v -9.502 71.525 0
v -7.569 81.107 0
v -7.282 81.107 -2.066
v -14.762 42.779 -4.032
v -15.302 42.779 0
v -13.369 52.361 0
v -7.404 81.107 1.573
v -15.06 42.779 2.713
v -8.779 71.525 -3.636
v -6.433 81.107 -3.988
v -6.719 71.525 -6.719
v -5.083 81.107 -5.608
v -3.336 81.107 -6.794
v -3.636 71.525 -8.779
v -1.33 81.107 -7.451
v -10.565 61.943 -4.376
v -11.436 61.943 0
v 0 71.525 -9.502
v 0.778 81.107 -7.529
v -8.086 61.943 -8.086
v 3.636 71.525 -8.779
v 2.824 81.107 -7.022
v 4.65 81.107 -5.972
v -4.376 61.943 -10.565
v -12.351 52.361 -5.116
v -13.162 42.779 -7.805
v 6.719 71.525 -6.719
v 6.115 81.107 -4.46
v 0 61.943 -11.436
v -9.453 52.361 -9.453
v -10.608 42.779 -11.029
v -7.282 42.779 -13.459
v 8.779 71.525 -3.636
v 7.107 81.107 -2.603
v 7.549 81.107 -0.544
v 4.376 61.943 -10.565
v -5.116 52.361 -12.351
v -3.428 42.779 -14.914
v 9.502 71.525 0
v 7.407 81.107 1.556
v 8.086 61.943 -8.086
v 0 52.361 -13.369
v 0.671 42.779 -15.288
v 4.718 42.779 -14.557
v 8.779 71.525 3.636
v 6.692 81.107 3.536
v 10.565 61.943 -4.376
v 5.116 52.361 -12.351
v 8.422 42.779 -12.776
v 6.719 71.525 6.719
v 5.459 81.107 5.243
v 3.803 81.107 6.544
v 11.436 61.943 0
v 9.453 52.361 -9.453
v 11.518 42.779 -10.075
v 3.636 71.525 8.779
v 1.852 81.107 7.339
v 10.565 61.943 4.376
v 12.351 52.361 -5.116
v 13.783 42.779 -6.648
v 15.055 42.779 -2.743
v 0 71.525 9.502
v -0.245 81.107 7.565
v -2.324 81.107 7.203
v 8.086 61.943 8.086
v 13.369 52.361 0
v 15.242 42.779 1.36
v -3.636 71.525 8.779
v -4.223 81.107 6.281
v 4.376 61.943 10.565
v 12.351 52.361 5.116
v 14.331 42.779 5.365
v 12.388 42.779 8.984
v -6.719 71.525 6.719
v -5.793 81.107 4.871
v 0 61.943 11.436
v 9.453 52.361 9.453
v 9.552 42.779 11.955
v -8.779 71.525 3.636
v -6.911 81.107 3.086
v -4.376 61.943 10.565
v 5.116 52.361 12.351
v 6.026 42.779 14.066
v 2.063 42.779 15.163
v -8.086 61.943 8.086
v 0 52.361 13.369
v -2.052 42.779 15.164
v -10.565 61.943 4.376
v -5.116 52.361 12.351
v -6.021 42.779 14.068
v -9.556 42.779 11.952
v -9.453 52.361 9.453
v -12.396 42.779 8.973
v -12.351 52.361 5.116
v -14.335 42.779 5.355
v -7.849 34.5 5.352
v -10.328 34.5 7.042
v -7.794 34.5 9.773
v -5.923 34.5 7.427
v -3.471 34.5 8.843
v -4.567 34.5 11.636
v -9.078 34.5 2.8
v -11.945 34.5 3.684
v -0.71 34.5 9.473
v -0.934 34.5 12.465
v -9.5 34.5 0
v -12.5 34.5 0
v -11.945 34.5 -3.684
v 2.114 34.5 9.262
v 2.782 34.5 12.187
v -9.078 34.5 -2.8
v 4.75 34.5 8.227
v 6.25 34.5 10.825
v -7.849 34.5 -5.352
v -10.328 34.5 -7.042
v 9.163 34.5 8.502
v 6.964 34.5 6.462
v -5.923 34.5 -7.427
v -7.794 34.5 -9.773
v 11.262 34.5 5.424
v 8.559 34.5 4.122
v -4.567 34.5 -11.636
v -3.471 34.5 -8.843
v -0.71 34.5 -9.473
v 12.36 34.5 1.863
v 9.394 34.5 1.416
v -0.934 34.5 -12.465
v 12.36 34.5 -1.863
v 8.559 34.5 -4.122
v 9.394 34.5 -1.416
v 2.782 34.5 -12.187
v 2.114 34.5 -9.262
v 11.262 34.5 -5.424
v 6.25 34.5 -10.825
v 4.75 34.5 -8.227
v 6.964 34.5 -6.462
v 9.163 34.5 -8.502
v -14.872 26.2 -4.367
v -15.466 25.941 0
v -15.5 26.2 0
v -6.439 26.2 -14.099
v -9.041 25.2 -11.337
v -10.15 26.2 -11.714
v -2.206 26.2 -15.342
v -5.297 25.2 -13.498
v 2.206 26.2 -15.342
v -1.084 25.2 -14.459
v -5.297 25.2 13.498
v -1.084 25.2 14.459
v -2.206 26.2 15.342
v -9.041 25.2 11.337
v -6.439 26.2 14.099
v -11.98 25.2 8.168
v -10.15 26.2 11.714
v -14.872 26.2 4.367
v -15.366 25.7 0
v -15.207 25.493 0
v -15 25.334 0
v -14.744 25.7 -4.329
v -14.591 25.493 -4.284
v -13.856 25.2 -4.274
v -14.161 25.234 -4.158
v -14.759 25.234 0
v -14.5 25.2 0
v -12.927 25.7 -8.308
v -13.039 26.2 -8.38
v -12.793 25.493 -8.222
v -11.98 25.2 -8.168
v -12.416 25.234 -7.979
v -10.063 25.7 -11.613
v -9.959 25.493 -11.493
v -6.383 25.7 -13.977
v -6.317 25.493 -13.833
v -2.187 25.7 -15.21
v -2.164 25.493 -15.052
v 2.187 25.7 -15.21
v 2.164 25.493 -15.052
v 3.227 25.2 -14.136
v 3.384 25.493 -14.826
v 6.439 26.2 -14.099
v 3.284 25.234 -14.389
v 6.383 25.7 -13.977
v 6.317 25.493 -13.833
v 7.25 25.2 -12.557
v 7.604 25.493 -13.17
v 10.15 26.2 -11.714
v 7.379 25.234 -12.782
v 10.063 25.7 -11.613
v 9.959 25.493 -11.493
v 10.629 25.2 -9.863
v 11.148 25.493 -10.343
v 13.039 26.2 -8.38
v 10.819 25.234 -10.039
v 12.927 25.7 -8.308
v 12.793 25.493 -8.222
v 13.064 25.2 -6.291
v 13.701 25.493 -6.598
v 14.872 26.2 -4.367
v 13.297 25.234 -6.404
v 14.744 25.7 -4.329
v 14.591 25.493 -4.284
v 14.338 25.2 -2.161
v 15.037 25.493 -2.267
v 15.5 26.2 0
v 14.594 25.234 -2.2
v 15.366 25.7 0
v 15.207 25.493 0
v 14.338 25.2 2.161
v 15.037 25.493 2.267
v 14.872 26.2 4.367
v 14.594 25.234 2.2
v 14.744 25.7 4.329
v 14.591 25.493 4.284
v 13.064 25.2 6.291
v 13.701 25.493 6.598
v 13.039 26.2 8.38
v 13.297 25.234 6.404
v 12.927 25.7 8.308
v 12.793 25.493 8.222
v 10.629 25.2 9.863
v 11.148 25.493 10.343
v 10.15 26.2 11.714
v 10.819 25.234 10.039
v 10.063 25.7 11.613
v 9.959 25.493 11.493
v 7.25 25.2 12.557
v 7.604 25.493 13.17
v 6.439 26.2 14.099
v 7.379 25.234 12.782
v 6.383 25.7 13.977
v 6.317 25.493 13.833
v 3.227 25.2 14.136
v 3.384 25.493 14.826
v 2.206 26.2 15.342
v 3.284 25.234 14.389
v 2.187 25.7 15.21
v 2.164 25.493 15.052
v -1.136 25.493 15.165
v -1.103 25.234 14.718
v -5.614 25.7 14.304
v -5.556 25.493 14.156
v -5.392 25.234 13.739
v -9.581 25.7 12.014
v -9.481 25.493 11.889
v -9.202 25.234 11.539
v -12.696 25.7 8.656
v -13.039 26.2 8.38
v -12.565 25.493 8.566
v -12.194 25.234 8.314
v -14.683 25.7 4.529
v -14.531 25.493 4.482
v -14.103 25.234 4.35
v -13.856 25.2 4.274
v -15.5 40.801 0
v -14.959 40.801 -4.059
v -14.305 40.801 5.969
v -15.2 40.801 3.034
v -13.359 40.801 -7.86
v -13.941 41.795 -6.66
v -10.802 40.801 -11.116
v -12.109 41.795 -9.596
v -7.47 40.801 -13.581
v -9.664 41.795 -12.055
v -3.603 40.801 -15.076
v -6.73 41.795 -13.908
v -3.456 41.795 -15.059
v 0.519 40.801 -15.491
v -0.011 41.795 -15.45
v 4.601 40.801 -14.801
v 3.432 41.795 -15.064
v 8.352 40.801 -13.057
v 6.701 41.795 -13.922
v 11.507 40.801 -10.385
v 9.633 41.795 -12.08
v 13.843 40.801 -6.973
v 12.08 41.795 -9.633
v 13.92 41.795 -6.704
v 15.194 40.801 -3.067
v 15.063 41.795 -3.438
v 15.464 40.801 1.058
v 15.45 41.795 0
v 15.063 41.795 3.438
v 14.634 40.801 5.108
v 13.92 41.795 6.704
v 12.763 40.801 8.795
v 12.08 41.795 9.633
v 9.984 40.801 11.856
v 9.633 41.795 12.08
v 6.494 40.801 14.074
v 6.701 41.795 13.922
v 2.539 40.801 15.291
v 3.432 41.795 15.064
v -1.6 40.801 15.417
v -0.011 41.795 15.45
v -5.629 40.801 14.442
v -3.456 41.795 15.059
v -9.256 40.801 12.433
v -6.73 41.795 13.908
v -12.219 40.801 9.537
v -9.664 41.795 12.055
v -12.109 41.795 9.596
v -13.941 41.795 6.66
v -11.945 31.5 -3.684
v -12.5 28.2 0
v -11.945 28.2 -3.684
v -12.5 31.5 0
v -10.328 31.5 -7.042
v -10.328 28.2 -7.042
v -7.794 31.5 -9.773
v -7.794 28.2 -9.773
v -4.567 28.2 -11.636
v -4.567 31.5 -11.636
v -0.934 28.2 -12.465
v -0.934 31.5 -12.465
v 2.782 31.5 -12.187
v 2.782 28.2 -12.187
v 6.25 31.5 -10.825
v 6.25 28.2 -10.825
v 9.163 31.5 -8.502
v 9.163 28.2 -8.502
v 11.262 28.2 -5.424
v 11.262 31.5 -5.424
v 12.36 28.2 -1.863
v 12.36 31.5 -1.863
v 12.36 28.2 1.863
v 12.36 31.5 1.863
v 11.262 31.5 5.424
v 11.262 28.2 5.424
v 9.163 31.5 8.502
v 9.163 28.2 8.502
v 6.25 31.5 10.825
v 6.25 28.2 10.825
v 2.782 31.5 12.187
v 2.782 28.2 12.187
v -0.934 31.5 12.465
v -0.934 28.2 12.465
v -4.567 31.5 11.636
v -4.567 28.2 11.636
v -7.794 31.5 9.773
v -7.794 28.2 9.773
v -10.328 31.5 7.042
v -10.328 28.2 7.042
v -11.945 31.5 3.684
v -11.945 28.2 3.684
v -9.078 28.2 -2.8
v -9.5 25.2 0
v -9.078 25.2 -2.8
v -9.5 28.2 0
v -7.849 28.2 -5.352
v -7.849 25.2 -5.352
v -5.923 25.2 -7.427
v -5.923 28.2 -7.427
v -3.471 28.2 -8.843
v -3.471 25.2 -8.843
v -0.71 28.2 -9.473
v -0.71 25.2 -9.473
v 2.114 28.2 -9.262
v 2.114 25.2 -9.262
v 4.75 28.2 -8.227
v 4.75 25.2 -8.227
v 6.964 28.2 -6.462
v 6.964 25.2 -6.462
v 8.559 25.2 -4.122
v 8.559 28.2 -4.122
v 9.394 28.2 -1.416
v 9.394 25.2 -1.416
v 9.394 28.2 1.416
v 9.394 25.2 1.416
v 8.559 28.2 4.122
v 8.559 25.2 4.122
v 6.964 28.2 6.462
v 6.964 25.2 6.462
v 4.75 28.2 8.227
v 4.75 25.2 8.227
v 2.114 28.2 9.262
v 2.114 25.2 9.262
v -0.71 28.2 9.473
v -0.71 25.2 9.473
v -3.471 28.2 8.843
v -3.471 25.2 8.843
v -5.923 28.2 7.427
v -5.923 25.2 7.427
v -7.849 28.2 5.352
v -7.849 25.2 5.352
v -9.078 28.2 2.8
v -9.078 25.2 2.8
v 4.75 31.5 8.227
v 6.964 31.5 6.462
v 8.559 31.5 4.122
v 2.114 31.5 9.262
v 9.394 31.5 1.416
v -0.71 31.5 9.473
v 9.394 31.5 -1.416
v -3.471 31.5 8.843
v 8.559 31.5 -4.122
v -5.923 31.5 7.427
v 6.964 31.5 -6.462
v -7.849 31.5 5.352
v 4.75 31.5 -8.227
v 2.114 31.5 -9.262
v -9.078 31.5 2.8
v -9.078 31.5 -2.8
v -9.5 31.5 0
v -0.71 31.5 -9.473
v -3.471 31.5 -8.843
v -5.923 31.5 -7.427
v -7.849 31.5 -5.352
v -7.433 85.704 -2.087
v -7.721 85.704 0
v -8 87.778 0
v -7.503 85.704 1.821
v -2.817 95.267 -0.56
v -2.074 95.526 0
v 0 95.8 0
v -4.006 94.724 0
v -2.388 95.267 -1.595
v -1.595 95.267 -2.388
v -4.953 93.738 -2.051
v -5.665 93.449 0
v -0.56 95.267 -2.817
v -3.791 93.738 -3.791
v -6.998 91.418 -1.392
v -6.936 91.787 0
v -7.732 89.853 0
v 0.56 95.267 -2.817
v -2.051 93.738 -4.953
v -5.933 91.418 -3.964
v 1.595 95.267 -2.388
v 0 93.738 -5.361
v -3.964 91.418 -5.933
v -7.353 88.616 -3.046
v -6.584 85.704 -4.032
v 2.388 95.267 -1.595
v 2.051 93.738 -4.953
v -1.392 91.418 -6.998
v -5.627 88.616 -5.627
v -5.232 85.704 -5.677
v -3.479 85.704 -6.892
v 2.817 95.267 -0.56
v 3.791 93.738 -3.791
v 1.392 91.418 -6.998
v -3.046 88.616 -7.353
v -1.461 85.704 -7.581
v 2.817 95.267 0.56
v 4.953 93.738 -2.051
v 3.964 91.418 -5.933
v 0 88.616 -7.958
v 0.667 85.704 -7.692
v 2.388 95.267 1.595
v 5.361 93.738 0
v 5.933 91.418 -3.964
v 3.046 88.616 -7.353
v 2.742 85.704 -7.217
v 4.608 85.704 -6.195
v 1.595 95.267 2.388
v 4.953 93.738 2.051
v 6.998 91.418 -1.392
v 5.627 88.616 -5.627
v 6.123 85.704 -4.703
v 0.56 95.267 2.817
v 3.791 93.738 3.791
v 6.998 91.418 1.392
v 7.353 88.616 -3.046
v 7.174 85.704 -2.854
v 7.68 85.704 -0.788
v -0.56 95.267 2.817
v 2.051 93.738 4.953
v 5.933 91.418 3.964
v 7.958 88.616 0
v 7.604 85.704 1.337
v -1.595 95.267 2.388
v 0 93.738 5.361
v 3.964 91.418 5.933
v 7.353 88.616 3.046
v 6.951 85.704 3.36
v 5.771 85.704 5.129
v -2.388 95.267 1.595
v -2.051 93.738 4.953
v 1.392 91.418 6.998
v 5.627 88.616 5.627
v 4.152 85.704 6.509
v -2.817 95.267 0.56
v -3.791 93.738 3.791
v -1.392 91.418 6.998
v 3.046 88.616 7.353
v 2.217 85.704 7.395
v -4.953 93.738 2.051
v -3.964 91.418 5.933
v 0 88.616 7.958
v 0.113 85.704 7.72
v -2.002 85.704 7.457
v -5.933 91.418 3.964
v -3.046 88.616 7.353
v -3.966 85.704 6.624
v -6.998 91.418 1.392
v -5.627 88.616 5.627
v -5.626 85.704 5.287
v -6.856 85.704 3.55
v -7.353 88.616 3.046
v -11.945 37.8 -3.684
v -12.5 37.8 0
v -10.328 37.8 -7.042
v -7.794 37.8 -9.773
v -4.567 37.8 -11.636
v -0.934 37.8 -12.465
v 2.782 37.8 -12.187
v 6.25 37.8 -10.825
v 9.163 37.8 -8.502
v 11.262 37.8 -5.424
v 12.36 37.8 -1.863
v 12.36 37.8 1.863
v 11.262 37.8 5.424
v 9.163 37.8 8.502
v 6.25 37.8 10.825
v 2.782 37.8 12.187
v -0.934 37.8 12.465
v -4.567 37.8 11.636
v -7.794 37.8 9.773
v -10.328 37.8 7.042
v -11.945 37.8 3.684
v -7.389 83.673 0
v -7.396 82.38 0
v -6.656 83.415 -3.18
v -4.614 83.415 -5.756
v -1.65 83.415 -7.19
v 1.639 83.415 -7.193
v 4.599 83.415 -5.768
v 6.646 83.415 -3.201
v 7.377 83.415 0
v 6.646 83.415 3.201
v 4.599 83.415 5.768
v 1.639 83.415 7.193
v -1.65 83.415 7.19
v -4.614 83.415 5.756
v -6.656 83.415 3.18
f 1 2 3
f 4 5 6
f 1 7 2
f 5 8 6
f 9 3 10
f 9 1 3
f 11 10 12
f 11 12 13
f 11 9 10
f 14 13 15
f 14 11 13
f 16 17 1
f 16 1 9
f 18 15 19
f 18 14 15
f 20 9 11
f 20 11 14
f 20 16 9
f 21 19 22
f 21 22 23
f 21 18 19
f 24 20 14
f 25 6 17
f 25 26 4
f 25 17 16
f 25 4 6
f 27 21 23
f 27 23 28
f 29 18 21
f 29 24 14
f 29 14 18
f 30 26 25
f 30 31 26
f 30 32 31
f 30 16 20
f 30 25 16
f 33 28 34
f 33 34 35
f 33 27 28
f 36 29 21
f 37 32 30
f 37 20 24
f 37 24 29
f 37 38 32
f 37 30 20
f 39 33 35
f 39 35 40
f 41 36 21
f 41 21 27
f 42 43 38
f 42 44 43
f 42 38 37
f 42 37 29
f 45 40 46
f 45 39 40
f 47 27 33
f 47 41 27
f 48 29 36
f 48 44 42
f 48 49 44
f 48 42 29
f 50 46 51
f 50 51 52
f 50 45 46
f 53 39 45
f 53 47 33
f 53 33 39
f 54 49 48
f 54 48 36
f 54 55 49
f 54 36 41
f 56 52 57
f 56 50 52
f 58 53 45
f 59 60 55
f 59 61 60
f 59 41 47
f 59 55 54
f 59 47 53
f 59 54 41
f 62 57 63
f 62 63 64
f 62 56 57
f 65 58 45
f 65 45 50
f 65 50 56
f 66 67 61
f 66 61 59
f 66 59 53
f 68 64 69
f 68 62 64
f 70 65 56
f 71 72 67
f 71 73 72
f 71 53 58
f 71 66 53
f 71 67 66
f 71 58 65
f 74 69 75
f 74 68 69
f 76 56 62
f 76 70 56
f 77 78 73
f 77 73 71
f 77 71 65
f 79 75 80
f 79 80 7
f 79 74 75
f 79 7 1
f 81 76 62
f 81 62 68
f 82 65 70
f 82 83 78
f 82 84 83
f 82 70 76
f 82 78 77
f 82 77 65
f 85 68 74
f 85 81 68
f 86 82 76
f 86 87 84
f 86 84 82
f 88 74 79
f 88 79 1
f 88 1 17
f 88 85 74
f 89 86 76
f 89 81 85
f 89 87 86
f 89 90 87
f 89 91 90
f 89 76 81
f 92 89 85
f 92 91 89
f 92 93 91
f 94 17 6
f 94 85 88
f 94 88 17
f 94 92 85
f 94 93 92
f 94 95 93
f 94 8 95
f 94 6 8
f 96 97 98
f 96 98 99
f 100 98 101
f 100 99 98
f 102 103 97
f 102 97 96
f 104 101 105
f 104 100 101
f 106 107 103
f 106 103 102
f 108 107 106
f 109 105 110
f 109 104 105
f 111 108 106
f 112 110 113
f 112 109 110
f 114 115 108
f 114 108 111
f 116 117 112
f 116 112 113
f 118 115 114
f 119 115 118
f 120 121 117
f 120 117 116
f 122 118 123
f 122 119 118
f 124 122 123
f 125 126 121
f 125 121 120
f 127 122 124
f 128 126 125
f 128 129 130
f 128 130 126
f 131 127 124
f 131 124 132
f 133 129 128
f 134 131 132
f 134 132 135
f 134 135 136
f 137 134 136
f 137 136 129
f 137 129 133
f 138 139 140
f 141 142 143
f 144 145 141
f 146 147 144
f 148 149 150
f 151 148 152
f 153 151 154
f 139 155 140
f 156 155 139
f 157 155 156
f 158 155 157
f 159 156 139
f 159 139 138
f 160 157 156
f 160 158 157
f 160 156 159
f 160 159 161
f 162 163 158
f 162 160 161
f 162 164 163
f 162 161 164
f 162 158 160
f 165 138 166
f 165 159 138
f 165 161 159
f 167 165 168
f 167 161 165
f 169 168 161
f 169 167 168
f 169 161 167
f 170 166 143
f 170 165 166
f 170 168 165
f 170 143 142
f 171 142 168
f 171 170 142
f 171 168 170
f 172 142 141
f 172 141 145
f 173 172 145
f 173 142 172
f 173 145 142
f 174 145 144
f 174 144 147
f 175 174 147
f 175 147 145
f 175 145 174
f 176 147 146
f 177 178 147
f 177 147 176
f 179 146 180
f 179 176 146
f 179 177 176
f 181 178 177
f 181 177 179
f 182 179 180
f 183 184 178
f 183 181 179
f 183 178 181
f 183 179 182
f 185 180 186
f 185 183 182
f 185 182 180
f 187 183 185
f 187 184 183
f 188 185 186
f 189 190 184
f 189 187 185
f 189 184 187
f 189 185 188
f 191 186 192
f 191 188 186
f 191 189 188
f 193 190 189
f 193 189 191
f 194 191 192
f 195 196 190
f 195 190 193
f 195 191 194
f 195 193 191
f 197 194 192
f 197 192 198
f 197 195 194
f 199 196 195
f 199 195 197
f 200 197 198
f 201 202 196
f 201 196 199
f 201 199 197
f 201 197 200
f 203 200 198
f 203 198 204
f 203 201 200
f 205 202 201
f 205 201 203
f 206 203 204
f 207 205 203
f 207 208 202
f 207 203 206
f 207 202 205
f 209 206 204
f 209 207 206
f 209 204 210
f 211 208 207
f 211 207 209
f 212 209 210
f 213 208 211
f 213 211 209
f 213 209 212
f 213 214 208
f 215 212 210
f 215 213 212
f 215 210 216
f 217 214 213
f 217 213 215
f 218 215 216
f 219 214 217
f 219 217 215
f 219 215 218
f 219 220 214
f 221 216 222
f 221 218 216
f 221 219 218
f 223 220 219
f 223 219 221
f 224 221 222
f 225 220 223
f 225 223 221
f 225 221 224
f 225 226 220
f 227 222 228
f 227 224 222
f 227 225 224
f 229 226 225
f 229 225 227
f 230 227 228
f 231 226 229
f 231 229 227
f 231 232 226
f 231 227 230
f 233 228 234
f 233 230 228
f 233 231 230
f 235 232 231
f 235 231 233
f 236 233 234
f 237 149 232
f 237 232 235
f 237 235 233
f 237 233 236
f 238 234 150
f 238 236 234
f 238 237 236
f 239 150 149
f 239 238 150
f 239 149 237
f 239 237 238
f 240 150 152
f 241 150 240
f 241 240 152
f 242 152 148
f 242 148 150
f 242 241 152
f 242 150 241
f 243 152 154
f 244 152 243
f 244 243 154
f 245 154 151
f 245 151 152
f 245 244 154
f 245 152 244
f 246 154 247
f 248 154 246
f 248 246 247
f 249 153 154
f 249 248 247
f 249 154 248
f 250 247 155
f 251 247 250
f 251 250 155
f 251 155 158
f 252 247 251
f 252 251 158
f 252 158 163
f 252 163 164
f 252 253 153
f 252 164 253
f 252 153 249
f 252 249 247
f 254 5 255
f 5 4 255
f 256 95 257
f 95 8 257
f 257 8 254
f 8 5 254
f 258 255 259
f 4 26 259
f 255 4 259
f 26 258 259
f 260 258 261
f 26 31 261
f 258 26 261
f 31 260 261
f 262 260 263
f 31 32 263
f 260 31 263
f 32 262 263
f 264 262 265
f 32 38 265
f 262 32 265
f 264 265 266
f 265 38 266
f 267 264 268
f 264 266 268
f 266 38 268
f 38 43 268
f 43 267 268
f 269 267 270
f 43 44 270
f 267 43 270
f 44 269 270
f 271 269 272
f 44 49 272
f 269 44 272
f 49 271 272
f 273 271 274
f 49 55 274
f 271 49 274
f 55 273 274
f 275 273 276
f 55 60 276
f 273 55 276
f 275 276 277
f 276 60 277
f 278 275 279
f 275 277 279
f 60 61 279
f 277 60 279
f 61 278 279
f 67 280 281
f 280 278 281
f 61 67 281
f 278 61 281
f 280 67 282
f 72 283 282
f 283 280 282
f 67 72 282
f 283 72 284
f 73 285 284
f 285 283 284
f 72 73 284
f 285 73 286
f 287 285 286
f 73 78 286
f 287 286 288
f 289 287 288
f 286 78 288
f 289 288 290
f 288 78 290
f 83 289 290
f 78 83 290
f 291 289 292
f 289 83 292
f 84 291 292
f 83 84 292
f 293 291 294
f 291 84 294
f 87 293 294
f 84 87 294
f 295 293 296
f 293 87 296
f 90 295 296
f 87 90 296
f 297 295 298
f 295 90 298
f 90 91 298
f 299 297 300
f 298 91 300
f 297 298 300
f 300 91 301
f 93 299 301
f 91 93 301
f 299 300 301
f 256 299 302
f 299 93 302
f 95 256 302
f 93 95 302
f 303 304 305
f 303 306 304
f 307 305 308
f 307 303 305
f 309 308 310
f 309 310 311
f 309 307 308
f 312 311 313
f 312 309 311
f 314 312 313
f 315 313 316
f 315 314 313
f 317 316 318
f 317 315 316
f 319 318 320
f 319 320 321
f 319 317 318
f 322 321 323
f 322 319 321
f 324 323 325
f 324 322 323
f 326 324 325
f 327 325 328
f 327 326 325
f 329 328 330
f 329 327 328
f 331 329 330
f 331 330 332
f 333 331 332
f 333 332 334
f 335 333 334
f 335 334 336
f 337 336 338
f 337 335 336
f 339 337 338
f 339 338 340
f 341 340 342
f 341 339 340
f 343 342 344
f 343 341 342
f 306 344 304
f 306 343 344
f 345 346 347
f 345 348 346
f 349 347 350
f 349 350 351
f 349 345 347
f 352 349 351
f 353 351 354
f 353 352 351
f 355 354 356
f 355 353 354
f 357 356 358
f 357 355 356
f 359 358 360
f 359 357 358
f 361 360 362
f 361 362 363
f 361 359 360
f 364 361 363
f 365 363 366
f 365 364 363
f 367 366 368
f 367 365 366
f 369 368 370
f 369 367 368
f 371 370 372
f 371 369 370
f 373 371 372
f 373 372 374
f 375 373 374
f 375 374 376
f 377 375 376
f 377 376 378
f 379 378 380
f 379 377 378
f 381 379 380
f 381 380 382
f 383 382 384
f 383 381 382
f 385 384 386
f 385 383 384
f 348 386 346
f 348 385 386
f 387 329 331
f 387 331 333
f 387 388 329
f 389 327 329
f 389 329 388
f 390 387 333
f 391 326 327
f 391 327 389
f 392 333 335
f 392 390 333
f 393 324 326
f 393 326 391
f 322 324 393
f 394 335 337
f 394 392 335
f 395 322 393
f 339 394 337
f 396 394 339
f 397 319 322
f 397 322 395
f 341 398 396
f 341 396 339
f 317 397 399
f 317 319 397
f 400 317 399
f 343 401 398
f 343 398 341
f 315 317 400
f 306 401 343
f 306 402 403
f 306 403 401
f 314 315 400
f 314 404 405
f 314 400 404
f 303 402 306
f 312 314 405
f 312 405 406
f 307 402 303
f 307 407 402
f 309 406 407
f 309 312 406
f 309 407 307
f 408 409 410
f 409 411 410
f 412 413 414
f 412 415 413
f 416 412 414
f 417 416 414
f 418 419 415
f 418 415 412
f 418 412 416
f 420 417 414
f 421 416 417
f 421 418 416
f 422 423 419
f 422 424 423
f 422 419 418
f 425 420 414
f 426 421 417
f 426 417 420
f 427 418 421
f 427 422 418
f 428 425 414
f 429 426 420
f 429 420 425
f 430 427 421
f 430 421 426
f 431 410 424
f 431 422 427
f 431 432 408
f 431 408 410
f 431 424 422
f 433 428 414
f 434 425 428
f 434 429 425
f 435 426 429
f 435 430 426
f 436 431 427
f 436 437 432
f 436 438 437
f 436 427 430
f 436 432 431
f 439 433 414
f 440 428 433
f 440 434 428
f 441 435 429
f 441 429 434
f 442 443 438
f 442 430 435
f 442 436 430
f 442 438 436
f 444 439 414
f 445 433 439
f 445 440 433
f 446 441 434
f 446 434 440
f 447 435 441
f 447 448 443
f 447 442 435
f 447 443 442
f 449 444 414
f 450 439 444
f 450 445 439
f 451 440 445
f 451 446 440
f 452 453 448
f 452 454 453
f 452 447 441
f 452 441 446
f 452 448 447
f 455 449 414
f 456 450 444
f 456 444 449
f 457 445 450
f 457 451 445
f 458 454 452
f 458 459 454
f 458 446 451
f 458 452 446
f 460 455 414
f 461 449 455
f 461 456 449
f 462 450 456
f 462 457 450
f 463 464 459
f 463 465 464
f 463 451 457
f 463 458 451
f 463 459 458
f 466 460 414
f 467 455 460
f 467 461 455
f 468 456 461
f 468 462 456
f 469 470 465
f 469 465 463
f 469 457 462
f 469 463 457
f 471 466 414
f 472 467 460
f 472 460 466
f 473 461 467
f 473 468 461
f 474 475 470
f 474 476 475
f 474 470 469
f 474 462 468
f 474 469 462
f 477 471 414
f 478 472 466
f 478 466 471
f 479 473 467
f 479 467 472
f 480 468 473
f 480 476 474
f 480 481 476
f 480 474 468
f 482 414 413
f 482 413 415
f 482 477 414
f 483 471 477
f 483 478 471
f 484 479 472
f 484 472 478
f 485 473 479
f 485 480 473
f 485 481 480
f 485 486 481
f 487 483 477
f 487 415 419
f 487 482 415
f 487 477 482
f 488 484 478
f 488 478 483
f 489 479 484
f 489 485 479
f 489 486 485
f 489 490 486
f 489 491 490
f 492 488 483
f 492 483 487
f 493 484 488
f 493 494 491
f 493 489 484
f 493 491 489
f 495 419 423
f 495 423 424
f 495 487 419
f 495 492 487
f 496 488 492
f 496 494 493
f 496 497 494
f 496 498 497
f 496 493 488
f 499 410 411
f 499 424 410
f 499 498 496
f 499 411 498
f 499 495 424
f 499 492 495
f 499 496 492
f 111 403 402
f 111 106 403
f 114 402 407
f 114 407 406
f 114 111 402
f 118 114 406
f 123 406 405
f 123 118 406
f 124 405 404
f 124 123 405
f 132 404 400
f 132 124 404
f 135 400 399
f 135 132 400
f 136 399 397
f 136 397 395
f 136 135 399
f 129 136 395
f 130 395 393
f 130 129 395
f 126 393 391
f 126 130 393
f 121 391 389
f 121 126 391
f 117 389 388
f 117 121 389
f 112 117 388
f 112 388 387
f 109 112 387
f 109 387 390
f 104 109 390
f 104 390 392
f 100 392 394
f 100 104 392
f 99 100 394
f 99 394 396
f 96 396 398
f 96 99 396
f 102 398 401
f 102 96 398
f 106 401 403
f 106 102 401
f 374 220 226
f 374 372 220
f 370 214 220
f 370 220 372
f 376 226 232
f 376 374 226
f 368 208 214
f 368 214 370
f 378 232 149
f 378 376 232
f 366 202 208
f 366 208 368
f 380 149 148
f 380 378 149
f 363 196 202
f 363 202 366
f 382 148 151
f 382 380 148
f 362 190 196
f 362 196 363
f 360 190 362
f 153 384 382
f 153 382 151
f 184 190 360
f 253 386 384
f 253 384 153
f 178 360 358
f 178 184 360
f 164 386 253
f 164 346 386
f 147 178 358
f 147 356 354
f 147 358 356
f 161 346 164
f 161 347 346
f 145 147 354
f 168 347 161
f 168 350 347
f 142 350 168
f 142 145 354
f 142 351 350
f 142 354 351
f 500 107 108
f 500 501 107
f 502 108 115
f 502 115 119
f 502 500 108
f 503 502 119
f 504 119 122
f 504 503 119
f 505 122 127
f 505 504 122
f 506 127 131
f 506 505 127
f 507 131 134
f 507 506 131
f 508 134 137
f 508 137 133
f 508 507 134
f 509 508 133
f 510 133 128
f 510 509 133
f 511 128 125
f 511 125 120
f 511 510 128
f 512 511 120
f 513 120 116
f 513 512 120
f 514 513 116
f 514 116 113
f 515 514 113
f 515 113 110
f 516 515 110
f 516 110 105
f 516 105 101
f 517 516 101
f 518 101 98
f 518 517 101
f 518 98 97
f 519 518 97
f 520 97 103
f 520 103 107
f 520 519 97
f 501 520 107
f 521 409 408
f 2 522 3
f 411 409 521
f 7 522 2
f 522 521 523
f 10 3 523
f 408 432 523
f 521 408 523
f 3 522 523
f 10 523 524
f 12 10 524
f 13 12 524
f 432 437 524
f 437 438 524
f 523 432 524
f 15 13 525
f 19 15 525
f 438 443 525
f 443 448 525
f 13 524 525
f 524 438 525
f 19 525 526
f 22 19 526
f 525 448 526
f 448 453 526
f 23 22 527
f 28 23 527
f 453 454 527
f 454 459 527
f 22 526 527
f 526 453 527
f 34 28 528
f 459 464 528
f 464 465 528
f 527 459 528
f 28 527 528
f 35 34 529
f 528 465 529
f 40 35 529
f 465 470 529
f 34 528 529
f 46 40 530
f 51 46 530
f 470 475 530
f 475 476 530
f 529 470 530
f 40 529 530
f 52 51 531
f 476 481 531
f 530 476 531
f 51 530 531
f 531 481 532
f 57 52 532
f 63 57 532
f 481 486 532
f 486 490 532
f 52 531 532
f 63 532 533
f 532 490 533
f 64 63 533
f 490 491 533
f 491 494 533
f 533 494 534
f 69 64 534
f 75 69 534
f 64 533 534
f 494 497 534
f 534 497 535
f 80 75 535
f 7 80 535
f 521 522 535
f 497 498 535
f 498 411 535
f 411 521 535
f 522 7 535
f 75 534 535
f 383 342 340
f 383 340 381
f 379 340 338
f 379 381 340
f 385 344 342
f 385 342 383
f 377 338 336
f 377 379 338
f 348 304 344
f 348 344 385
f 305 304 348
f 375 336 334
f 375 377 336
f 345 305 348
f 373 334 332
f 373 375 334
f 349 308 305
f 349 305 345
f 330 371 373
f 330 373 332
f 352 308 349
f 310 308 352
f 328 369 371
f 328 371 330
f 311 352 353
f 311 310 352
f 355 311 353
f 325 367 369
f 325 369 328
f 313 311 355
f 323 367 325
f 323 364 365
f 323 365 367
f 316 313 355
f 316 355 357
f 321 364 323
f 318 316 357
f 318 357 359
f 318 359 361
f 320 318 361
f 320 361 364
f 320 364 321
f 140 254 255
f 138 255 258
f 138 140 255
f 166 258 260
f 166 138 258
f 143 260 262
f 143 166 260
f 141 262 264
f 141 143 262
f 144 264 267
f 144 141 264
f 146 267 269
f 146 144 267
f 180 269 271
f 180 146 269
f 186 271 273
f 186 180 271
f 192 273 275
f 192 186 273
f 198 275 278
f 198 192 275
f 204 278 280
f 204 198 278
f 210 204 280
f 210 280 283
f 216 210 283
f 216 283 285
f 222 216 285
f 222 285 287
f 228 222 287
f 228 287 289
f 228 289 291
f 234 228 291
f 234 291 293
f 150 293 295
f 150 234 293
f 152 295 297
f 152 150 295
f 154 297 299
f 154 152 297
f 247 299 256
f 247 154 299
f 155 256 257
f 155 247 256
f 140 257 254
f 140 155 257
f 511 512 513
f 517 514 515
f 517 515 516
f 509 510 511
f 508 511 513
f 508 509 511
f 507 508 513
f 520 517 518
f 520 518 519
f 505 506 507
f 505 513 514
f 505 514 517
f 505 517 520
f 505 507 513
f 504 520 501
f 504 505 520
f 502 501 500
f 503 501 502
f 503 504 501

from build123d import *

# Parameters (mm, degrees)
CONG_1_R = 10
CONG_2_R = 1


with BuildPart() as part:
    # Esquisse1 → Révolution2 (revolve)
    with BuildSketch(Plane.XY):
        with BuildLine():
            Line((-12.5, 28.2), (-12.5, 31.5))
            Line((-12.5, 31.5), (-9.5, 31.5))
            Line((-9.5, 31.5), (-9.5, 34.5))
            Line((-9.5, 34.5), (-12.5, 34.5))
            Line((-12.5, 34.5), (-12.5, 37.8))
            Line((-12.5, 37.8), (0, 37.8))
            Line((0, 37.8), (0, 95.8))
            ThreePointArc((0, 95.8), (-6.891439137, 91.863012013), (-7, 83.927016654))
            Line((-7, 83.927016654), (-15.5, 41.8))
            Line((-15.5, 41.8), (-15.5, 25.2))
            Line((-15.5, 25.2), (-12.5, 25.2))
            Line((-12.5, 25.2), (-9.5, 25.2))
            Line((-9.5, 25.2), (-9.5, 28.2))
            Line((-9.5, 28.2), (-12.5, 28.2))
        make_face()
    revolve(axis=Axis((0, 95.8, 0), (0, -1, 0)))

    # Congé1
    cong_1_edges = [part.edges().sort_by_distance(p)[0] for p in [
        (15.5, 41.8, 0),
        (7, 83.927016654, 0),
    ]]
    fillet(cong_1_edges, radius=CONG_1_R)

    # Congé2
    cong_2_edges = [part.edges().sort_by_distance(p)[0] for p in [
        (15.5, 25.2, 0),
    ]]
    fillet(cong_2_edges, radius=CONG_2_R)


solid = part.part
